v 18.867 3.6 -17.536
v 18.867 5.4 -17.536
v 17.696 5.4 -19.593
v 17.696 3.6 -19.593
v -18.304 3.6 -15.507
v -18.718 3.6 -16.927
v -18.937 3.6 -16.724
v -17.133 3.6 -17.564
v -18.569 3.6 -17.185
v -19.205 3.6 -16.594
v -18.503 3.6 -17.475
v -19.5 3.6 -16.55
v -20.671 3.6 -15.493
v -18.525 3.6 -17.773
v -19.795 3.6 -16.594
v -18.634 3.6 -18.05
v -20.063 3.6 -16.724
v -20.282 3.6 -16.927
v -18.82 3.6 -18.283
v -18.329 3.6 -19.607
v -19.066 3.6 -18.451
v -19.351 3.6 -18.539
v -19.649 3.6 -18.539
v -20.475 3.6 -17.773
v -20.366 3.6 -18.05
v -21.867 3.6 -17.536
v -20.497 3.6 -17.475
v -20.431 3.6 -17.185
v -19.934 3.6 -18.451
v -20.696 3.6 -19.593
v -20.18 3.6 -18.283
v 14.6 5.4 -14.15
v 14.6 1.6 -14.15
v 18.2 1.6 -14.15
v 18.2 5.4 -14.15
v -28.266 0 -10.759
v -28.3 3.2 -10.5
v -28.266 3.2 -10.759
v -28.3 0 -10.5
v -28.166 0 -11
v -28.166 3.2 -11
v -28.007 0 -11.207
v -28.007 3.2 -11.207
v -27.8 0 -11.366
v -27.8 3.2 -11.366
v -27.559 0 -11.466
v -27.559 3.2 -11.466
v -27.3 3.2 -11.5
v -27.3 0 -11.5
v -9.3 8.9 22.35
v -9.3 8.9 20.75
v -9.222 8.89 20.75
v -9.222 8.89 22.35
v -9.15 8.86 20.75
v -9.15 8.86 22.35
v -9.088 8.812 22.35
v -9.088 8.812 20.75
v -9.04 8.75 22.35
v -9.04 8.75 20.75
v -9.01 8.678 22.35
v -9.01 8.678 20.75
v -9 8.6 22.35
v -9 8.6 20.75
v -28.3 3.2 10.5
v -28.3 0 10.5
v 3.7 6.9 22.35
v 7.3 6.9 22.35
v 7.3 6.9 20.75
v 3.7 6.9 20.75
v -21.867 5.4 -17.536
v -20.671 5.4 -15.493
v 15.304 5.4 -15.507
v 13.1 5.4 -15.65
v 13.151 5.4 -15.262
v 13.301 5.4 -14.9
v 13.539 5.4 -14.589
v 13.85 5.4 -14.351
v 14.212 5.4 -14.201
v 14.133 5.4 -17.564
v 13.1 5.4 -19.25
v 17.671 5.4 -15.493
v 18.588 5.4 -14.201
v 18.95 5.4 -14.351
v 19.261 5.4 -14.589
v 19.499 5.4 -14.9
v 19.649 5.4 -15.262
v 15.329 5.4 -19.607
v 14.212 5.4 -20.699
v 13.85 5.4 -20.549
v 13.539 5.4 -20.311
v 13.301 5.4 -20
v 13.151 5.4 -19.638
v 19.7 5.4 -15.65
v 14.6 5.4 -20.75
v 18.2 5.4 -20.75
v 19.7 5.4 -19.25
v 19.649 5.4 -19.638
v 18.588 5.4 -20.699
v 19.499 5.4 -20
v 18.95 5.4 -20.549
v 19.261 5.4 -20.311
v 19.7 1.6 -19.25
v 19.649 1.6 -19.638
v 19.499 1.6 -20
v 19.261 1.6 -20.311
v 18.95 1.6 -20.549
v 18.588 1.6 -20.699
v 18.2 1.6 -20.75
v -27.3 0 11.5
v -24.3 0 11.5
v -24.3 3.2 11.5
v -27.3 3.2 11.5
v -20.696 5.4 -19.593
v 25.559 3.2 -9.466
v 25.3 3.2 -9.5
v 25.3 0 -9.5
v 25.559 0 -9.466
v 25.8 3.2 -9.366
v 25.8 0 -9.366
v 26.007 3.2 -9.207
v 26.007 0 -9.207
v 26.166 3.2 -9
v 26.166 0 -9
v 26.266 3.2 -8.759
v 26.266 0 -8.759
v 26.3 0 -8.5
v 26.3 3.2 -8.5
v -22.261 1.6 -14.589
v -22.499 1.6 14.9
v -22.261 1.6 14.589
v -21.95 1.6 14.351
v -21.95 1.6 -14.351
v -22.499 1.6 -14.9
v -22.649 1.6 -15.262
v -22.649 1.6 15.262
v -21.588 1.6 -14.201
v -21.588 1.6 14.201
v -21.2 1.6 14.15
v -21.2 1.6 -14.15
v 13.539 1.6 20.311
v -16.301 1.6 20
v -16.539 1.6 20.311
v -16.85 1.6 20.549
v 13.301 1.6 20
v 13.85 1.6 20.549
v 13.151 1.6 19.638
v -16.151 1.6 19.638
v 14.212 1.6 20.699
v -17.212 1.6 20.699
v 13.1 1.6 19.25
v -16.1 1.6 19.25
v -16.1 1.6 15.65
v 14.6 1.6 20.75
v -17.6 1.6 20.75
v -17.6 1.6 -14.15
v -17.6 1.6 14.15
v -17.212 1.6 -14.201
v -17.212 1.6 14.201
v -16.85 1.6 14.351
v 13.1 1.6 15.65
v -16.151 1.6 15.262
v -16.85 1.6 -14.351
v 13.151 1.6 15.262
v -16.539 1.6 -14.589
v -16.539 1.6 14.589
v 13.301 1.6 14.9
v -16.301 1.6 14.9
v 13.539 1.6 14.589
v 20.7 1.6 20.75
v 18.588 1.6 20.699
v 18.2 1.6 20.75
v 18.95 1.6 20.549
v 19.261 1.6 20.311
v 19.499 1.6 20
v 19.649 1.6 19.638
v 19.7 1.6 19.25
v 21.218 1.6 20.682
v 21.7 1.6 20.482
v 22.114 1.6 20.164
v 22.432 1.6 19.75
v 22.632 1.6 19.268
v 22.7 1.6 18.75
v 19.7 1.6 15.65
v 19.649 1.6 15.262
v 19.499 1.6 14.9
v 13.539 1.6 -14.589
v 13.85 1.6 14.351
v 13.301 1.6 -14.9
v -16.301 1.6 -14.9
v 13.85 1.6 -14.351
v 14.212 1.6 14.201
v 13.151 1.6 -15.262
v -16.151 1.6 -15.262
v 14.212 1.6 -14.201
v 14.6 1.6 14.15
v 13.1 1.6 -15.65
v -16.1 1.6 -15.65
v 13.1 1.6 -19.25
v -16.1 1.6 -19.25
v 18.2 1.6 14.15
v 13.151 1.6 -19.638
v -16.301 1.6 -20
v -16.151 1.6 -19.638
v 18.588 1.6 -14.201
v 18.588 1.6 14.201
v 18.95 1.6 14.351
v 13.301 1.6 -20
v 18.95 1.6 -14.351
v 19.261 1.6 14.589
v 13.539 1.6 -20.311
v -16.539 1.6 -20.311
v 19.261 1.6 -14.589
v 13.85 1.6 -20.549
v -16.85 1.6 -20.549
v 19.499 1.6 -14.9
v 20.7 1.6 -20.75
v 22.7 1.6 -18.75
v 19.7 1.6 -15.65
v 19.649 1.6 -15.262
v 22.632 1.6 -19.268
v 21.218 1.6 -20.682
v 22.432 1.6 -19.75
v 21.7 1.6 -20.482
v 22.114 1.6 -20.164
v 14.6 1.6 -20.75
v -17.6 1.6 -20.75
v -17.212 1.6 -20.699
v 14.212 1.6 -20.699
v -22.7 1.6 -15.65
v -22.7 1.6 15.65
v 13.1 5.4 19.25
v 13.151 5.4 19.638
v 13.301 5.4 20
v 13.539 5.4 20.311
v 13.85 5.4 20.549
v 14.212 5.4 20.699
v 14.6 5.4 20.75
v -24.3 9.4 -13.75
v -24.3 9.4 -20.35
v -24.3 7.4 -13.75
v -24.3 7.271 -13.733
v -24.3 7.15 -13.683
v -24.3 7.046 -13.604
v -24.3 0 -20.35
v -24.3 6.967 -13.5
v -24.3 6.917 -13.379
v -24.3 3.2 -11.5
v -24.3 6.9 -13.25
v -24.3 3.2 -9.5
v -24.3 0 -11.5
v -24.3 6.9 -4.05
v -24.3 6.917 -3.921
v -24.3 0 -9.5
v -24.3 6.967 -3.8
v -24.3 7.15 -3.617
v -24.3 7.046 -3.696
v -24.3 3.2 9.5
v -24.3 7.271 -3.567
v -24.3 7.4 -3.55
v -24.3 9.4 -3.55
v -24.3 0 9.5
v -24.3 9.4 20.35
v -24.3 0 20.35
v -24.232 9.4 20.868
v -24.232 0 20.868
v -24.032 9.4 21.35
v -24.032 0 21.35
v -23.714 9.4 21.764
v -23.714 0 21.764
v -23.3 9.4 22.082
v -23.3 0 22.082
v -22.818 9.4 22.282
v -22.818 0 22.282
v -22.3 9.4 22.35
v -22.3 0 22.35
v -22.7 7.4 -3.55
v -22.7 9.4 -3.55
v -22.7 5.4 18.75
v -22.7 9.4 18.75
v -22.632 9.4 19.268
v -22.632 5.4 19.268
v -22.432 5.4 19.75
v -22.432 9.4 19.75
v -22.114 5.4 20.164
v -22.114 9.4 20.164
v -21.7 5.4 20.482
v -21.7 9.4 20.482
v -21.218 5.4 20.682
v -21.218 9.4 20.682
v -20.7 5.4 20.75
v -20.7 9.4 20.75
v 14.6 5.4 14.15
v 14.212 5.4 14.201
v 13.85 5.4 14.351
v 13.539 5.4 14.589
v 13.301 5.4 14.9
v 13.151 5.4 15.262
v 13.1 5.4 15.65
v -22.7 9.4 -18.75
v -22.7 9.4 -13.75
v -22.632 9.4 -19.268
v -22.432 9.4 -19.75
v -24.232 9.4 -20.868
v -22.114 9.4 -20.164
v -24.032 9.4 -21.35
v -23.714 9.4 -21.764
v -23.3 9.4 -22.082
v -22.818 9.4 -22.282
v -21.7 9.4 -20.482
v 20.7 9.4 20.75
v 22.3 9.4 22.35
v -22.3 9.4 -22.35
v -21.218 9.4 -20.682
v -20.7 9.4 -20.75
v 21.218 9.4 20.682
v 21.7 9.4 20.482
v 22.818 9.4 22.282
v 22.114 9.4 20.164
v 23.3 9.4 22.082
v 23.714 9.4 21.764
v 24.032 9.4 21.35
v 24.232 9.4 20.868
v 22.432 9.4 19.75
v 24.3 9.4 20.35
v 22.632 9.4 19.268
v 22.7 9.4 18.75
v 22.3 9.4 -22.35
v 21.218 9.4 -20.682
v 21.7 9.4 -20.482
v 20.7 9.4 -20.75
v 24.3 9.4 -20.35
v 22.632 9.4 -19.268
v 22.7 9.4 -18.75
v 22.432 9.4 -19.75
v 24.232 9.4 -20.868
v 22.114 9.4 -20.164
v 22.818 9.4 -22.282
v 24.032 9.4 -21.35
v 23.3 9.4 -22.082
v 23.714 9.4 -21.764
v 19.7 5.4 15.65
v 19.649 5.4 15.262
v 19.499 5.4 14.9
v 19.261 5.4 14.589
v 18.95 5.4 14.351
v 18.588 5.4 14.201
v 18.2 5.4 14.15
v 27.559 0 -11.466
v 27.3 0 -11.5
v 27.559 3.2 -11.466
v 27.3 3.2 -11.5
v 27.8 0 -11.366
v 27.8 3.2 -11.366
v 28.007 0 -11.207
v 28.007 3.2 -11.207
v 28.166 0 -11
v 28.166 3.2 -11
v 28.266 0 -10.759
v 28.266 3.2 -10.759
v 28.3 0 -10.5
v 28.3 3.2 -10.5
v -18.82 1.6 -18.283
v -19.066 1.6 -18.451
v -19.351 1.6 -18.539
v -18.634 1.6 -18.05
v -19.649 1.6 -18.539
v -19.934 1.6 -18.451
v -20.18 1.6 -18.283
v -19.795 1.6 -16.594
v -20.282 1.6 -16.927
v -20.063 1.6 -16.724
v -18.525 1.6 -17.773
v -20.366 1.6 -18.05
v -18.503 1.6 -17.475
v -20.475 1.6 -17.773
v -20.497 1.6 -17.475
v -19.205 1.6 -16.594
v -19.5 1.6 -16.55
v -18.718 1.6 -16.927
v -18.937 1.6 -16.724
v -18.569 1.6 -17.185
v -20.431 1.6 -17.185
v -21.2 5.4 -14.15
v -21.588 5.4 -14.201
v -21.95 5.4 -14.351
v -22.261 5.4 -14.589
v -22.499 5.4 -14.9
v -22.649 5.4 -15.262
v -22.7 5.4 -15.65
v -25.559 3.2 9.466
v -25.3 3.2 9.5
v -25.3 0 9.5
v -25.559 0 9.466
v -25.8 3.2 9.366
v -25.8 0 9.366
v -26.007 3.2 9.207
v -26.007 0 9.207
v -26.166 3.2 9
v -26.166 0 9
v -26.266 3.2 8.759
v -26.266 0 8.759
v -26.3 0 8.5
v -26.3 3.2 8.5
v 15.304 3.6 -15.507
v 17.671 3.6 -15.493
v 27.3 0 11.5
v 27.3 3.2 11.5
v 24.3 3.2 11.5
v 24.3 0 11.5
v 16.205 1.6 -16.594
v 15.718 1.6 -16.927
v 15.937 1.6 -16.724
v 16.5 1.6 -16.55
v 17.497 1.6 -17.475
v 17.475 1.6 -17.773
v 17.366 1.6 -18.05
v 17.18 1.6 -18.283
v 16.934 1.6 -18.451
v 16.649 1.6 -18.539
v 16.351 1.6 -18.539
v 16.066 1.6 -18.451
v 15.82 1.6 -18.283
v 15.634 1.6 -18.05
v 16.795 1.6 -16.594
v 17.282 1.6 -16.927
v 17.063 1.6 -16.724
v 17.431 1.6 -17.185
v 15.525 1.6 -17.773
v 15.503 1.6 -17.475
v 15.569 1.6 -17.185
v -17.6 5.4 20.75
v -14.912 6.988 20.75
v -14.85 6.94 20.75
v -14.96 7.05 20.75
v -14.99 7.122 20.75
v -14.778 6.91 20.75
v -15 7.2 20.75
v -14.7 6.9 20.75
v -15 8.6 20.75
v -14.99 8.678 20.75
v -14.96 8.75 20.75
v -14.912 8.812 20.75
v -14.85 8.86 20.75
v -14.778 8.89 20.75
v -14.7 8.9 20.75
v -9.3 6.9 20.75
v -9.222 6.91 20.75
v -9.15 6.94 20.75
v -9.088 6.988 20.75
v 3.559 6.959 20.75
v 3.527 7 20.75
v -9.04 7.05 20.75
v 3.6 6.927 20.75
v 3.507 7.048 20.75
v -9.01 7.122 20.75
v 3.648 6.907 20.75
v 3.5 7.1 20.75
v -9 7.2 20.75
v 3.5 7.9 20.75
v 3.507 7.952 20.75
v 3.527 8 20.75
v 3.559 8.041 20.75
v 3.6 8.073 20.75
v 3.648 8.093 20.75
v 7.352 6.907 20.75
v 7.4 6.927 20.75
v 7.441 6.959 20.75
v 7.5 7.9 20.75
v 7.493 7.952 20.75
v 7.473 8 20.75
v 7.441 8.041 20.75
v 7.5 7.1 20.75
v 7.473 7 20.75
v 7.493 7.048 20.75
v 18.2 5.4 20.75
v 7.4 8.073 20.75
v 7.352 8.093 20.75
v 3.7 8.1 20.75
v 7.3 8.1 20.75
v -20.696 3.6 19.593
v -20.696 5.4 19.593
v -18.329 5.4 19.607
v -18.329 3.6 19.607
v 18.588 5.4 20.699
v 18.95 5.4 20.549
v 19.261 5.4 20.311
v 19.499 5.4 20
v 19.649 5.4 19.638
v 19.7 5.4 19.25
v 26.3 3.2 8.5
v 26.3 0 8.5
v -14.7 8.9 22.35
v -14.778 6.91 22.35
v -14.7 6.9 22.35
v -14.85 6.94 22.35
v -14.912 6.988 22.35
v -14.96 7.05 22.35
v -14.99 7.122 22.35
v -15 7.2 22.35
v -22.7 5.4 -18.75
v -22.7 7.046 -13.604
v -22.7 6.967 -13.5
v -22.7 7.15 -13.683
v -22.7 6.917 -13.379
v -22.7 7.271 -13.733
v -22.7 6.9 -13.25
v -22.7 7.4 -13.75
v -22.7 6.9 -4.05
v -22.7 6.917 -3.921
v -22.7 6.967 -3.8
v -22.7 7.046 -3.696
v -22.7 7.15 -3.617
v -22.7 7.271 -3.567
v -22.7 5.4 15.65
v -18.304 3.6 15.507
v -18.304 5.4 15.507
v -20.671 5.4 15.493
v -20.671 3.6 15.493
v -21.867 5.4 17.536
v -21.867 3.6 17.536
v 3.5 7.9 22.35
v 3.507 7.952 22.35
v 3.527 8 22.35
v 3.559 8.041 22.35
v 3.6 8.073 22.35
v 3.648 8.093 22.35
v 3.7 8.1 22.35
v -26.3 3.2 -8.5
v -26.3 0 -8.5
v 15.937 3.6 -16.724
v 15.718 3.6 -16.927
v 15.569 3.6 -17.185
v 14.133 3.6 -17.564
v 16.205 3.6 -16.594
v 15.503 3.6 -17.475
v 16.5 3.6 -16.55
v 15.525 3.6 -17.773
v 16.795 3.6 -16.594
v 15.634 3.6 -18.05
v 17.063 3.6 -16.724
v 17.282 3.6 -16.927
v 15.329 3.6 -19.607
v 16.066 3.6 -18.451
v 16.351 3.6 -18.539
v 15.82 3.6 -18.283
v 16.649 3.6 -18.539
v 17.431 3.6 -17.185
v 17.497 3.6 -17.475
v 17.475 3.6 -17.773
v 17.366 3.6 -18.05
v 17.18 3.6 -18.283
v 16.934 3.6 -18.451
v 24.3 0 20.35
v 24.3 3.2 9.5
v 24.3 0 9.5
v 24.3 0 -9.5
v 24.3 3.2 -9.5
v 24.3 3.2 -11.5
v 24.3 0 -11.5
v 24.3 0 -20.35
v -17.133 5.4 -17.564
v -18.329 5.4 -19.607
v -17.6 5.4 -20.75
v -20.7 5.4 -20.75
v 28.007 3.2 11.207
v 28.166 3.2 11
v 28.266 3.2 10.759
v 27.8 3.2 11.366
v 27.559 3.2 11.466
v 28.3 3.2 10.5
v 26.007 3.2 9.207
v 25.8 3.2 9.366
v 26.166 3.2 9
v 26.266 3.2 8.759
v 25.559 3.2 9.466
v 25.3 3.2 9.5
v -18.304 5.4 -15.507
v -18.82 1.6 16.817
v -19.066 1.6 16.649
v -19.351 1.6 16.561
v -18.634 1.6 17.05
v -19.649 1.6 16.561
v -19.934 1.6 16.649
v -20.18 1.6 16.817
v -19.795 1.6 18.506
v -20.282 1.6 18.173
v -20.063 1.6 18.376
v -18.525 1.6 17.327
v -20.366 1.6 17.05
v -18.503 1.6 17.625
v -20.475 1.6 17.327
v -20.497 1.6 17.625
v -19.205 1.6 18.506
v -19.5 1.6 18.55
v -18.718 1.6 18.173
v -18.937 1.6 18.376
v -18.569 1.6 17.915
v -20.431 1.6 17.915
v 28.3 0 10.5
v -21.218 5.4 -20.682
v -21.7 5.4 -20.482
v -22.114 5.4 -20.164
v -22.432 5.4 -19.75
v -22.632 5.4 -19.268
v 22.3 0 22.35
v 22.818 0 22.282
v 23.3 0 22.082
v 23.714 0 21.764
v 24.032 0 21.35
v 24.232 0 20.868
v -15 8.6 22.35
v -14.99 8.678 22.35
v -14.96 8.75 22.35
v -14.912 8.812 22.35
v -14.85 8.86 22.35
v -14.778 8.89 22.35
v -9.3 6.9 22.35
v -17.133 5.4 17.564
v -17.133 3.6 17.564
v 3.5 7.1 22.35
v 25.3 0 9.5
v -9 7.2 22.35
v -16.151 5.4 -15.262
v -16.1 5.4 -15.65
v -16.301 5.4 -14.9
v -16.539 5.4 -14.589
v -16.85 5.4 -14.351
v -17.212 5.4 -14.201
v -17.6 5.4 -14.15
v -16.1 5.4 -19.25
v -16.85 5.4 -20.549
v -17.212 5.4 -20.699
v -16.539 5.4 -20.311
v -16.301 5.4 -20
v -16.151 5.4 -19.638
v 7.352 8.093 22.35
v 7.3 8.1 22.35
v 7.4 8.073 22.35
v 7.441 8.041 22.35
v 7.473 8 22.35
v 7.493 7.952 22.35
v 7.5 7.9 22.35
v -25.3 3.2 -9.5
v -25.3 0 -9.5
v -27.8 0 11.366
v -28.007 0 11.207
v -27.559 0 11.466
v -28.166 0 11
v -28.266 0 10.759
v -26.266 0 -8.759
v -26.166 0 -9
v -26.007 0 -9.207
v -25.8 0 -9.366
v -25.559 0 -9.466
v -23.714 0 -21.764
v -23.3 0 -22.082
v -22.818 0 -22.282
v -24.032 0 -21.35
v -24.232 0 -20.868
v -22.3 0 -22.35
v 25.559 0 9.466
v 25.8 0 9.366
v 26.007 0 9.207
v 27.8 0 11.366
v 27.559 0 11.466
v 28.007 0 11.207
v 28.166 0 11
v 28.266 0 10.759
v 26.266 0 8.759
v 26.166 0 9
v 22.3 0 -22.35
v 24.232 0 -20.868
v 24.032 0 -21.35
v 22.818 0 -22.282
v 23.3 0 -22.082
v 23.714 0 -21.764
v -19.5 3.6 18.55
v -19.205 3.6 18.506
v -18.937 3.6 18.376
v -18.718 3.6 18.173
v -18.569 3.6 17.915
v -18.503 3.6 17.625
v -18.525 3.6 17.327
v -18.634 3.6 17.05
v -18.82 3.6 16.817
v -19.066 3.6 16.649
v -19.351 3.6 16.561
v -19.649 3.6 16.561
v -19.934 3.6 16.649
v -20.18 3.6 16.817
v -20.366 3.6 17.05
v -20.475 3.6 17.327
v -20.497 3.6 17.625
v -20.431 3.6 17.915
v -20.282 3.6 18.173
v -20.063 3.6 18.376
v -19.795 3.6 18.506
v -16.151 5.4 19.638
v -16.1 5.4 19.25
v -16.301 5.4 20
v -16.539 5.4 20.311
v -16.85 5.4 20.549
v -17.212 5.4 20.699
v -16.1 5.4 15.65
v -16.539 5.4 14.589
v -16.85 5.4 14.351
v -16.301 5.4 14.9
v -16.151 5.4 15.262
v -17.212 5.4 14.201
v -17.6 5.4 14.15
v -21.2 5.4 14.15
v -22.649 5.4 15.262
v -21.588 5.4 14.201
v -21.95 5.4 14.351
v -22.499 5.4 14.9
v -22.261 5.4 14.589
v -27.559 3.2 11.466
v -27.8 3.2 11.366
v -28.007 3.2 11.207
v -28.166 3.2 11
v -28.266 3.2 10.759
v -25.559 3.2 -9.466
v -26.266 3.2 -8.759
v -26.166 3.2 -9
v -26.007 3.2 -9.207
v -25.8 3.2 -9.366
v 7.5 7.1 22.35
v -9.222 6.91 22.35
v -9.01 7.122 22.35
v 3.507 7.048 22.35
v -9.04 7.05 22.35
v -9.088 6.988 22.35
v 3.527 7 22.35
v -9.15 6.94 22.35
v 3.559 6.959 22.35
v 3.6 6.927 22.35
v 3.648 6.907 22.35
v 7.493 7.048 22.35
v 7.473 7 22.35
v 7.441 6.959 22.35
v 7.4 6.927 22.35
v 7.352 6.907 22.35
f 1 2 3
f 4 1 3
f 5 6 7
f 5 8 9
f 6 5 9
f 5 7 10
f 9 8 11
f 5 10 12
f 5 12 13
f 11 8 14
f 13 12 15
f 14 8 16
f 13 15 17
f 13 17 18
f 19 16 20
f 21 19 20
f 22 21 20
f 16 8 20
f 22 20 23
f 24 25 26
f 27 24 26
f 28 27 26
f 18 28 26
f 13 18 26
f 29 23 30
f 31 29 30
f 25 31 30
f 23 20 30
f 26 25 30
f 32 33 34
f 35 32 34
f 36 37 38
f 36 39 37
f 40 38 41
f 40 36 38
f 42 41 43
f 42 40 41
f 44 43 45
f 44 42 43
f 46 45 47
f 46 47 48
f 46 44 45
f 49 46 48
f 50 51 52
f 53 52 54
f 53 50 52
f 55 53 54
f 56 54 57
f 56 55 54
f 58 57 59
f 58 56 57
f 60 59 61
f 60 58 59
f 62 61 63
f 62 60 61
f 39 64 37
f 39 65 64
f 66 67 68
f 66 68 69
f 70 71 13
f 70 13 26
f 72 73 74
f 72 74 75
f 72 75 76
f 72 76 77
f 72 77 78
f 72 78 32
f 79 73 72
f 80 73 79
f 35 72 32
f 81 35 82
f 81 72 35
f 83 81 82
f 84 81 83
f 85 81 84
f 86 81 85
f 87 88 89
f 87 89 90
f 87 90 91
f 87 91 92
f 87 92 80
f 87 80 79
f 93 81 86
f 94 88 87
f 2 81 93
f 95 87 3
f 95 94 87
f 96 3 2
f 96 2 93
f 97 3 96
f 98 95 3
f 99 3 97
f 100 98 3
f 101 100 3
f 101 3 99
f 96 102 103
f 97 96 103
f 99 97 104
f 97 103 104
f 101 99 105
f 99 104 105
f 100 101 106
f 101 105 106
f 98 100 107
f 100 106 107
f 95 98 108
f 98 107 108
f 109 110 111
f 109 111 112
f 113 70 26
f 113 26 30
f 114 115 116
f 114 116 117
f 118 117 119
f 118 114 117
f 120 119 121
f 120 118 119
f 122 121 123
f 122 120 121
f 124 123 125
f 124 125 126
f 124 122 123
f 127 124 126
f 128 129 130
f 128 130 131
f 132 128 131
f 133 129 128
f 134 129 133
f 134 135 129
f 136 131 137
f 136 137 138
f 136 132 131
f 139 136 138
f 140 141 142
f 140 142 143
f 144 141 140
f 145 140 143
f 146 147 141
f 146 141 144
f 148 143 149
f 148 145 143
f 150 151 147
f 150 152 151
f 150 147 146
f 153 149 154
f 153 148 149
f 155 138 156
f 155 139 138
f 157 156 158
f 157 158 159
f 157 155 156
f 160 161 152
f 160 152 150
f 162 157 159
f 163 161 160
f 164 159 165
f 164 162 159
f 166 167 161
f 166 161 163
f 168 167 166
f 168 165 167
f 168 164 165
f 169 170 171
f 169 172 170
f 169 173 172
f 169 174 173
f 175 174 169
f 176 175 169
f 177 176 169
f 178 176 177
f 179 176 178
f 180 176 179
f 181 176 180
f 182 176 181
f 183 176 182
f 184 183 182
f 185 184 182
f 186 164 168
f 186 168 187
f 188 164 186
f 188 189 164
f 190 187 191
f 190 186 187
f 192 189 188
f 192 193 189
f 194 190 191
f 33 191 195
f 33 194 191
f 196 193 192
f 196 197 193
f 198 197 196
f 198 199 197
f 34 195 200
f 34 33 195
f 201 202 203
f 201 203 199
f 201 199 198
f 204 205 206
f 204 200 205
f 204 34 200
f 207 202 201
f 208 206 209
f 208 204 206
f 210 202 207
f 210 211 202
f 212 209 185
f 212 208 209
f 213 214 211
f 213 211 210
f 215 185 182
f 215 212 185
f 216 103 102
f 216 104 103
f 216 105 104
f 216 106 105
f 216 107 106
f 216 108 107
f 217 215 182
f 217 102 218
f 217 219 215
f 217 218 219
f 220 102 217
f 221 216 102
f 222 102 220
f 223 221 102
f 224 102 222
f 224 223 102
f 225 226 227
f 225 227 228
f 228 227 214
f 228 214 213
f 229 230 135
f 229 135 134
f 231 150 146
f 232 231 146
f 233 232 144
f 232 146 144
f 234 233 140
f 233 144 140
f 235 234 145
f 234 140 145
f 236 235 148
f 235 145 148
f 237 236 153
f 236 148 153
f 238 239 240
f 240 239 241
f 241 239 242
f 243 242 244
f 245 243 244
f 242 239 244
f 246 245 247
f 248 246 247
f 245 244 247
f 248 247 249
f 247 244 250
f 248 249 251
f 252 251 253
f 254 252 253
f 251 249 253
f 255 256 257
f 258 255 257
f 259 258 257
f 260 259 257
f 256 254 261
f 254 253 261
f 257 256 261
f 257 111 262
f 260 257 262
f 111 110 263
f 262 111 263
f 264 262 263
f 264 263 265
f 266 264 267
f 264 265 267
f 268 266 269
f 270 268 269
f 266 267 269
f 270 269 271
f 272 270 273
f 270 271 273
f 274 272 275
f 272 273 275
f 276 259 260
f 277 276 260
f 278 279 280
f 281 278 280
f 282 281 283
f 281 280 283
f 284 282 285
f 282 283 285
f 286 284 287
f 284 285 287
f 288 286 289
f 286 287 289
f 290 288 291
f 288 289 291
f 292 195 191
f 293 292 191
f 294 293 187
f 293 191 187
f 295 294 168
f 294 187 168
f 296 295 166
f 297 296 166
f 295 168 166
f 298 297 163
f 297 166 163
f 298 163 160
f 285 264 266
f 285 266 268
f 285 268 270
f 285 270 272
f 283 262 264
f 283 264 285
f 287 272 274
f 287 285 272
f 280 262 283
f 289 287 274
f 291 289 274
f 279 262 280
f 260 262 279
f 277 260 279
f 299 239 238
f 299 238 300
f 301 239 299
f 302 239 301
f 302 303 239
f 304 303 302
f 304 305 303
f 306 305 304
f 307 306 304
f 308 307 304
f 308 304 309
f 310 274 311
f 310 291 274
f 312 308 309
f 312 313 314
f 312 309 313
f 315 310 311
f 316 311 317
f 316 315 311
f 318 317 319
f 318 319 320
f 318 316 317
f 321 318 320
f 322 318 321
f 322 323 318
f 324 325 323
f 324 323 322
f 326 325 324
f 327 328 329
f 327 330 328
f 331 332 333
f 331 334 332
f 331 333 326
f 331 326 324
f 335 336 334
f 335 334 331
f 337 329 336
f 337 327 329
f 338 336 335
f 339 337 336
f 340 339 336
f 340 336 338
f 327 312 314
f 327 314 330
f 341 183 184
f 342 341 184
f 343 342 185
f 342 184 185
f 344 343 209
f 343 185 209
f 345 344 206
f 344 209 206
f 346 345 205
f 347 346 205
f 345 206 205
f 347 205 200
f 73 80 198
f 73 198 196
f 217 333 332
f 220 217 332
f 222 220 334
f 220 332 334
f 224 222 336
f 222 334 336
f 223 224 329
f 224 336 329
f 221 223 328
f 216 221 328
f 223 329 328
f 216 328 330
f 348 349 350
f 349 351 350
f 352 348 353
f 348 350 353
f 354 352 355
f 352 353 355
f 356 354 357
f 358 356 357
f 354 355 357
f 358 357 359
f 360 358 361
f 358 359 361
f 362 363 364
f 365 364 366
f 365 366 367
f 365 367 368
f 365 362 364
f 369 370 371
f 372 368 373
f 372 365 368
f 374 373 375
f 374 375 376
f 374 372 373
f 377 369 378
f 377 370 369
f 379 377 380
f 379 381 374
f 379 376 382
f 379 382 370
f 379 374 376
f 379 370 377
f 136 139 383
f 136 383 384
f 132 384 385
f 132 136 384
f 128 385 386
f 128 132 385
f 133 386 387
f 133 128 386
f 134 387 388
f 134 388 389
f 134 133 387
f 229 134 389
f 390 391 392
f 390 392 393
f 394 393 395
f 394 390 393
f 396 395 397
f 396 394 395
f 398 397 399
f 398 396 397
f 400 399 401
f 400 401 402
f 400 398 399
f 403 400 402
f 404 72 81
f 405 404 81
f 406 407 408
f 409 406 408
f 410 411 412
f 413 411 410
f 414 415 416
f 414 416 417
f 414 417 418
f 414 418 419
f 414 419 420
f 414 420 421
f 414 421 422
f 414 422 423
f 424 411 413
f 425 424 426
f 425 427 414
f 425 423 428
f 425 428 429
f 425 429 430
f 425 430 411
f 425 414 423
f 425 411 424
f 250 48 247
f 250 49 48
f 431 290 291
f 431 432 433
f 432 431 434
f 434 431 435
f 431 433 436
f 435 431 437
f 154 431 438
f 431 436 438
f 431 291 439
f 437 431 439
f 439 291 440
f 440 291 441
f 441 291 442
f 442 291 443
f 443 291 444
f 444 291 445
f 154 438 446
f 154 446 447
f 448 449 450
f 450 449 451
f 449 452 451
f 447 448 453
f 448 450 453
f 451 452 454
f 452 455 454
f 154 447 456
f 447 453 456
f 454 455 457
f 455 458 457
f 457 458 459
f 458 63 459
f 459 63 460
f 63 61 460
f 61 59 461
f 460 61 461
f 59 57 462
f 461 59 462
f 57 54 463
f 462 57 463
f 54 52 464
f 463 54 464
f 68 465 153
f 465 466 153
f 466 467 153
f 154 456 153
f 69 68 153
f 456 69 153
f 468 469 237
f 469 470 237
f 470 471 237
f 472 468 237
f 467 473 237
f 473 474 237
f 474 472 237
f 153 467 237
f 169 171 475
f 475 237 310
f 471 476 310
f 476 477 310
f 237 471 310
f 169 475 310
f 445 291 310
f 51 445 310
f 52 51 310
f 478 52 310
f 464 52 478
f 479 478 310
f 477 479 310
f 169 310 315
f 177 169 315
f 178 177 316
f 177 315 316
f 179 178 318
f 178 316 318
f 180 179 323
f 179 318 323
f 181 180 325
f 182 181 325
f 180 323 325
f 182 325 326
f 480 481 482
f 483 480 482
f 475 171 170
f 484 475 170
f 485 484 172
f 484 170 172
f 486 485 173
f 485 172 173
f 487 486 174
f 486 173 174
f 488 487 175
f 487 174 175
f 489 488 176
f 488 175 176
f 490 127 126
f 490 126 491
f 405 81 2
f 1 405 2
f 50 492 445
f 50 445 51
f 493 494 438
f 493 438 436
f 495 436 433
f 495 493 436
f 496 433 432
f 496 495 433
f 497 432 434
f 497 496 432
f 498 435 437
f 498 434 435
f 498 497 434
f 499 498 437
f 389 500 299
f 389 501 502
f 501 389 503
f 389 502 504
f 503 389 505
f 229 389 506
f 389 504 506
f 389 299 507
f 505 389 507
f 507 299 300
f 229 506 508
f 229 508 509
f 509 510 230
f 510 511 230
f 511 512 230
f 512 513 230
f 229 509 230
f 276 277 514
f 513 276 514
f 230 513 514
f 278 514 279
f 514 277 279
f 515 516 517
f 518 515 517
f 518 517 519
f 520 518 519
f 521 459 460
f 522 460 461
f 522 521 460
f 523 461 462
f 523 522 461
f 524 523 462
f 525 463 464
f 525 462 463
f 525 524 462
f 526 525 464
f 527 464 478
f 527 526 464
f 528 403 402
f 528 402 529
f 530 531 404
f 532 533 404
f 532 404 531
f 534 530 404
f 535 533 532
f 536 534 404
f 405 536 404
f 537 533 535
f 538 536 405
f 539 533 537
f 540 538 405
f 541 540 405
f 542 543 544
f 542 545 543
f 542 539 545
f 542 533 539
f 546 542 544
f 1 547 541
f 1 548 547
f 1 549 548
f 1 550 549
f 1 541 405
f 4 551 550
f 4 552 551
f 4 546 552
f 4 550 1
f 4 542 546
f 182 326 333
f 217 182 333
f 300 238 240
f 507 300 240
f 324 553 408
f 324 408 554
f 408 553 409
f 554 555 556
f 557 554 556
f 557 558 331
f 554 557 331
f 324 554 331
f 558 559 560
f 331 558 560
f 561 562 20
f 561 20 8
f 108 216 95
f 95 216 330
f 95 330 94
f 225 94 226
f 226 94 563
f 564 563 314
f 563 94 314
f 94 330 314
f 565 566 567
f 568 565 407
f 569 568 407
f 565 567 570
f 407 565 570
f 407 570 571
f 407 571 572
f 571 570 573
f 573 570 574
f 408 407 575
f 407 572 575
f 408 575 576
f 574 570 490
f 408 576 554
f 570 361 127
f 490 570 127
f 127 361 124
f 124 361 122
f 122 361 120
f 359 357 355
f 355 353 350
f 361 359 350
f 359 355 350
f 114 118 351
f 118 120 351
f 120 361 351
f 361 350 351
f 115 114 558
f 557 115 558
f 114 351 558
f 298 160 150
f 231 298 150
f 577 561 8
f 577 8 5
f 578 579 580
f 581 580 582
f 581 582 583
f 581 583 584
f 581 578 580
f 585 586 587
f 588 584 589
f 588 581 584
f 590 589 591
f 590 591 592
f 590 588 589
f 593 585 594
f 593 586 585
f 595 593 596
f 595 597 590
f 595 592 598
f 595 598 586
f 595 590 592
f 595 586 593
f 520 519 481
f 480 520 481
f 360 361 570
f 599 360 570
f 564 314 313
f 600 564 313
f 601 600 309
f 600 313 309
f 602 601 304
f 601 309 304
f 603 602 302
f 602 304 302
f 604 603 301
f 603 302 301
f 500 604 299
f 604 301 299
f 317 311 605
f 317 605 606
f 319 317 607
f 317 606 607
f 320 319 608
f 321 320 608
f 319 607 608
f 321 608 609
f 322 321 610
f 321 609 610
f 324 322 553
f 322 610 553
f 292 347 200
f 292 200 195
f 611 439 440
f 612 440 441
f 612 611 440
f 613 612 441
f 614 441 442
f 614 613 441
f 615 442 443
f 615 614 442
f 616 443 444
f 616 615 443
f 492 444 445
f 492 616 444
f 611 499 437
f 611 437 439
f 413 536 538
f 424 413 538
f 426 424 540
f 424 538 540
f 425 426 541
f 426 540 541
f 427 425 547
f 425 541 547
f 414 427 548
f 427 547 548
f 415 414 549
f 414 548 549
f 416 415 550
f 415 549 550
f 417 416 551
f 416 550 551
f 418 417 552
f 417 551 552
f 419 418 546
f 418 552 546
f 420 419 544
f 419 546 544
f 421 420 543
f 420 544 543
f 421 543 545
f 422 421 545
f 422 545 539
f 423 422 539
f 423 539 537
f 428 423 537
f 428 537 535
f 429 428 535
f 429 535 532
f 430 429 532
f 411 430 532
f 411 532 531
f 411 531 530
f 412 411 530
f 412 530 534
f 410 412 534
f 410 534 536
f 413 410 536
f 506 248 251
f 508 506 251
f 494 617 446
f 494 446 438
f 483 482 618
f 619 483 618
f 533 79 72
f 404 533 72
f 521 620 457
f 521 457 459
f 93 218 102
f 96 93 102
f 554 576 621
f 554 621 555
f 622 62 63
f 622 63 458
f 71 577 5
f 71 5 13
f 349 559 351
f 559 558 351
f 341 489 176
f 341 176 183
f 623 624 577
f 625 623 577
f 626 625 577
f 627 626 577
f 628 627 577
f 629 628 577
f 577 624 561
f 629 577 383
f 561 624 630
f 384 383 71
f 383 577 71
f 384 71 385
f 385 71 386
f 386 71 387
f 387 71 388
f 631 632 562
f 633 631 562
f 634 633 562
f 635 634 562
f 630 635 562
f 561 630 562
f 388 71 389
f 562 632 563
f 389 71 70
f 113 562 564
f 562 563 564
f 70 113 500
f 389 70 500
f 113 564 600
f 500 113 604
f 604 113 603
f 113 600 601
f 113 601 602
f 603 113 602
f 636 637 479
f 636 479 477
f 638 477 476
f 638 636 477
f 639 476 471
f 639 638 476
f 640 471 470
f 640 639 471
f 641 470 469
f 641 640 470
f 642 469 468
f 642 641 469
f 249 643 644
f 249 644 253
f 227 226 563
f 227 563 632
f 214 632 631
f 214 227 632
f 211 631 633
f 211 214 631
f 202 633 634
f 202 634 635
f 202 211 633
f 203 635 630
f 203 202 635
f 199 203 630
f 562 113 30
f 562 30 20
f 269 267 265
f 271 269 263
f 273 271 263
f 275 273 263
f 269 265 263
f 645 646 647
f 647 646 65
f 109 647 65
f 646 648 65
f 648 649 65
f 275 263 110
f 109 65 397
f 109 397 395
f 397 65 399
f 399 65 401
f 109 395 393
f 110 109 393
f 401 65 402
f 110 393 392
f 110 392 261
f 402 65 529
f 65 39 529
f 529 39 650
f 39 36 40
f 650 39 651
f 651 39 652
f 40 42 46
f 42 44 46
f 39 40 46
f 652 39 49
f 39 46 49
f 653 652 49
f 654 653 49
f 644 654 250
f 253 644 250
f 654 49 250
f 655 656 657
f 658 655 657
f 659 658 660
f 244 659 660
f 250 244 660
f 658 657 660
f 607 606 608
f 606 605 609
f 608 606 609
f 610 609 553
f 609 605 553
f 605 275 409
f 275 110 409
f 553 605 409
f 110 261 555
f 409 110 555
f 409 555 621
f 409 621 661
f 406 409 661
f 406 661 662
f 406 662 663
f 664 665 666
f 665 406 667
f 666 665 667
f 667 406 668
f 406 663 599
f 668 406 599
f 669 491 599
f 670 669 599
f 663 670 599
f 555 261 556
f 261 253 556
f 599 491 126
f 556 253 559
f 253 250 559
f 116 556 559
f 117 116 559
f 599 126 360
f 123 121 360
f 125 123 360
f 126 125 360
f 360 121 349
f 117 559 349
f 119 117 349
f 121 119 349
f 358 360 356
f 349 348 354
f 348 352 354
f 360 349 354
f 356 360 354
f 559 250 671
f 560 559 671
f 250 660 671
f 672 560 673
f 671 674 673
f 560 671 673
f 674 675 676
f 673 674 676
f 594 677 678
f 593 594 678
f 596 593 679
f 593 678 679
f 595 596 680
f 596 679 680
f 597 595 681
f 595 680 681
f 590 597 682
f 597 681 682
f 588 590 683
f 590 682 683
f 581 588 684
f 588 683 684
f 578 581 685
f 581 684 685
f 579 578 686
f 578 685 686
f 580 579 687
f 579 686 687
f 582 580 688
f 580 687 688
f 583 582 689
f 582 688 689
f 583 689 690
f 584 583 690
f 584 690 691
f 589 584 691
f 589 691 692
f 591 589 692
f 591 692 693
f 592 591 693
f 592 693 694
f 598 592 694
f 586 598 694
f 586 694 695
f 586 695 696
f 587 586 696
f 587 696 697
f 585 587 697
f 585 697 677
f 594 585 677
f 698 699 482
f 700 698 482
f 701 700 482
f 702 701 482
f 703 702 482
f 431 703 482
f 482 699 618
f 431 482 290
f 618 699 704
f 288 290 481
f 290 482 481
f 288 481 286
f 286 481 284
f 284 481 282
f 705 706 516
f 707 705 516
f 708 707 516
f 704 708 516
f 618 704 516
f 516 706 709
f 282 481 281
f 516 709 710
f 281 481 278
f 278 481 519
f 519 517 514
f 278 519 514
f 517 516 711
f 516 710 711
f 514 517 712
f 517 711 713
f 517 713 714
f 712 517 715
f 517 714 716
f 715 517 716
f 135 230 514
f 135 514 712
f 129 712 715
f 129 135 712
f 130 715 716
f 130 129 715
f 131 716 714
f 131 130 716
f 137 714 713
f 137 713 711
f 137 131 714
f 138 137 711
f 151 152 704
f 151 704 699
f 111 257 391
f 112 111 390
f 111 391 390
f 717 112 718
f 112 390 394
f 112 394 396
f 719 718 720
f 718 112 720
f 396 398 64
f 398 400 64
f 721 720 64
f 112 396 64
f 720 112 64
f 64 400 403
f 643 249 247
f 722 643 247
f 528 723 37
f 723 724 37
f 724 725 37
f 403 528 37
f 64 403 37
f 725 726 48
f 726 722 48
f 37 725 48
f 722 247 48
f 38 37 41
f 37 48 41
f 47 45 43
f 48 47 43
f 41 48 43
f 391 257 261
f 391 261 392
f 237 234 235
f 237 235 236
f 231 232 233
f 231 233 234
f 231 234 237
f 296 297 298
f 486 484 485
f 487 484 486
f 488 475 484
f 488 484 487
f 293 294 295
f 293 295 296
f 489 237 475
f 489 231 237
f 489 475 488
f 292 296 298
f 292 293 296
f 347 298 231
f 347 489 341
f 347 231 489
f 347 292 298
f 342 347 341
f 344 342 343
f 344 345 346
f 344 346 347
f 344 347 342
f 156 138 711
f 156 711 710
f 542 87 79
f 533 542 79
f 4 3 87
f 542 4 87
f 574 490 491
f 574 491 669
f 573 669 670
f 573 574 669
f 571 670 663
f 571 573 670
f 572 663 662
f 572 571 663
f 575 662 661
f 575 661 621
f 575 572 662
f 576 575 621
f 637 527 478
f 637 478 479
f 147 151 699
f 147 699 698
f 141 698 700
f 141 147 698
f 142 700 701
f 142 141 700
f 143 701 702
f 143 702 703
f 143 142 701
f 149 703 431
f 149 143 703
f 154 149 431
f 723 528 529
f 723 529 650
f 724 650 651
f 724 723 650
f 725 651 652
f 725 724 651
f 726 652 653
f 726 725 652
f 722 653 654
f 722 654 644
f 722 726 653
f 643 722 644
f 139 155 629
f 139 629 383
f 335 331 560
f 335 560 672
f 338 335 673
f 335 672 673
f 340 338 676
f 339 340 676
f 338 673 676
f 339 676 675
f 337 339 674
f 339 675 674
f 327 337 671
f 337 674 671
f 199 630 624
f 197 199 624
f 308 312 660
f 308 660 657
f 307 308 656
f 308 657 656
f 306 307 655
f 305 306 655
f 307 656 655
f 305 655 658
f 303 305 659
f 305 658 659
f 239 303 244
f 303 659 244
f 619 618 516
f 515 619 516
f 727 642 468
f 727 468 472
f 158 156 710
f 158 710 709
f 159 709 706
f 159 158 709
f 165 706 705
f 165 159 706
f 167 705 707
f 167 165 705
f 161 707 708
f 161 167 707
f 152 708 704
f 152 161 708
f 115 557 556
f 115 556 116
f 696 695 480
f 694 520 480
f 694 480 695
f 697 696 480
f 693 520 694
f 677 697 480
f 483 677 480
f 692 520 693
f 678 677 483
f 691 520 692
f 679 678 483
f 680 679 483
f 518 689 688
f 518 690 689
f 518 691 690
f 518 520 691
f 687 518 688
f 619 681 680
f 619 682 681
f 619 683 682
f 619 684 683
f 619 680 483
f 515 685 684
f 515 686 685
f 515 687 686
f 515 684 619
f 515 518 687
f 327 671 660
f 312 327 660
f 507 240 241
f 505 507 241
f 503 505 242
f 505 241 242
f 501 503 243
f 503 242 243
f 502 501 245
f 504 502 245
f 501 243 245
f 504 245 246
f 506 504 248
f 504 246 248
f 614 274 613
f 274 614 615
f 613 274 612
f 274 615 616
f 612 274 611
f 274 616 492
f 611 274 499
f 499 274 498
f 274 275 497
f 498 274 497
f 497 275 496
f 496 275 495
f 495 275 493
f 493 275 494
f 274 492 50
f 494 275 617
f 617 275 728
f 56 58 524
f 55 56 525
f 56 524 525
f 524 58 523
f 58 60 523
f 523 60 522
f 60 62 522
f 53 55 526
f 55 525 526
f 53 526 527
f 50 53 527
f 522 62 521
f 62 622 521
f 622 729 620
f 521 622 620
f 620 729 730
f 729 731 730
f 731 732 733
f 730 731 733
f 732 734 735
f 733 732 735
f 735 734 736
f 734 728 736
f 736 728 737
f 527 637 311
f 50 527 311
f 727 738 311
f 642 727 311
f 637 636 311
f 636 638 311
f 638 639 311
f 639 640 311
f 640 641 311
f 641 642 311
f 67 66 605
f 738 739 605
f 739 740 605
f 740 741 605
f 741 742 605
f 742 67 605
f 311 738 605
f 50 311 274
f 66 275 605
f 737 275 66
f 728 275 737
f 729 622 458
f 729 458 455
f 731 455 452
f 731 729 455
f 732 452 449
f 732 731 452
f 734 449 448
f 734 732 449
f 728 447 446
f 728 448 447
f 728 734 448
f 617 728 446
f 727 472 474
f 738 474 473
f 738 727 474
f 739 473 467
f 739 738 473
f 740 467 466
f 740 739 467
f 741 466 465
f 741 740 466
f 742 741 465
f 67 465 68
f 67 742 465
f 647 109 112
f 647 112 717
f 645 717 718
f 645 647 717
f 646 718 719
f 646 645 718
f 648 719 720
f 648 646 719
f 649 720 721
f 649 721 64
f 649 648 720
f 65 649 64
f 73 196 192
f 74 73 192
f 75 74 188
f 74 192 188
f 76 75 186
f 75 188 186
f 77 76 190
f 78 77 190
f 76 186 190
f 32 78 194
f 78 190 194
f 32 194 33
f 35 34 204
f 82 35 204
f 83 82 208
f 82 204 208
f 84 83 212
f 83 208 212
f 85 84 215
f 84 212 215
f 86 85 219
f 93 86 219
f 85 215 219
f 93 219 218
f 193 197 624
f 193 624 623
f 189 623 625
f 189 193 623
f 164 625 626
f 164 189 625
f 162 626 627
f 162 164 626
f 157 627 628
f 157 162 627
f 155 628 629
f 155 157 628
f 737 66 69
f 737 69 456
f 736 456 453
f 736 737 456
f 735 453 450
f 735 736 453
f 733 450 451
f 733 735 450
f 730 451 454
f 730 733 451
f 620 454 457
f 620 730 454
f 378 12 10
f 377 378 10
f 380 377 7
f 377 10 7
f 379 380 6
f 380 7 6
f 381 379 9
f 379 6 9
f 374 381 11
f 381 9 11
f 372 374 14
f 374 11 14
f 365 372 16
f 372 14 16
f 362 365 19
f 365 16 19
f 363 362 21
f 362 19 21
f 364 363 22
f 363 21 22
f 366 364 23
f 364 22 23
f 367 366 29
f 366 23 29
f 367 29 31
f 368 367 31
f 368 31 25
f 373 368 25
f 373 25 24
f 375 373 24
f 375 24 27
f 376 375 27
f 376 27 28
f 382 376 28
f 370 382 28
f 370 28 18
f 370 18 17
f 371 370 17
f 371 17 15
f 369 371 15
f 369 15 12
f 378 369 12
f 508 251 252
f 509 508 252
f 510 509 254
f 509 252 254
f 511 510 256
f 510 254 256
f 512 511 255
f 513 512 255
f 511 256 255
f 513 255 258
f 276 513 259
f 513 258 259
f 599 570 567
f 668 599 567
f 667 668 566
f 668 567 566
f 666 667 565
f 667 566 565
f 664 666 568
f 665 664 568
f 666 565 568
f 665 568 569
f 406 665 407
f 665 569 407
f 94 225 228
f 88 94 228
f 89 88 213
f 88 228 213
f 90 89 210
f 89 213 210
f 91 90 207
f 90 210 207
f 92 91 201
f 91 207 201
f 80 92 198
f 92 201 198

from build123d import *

# Parameters (mm, degrees)
EXTRUDE_1_DEPTH     = 9.4
CUT_EXTRUDE_1_DEPTH = 7.8
EXTRUDE_2_DEPTH     = 3.8
CUT_EXTRUDE_2_DEPTH = 1.8
SKETCH_5_R          = 1
CUT_EXTRUDE_4_DEPTH = 3.8
CUT_EXTRUDE_5_DEPTH = 2.8
CUT_EXTRUDE_6_DEPTH = 2.8
CUT_EXTRUDE_7_DEPTH = 2.8
EXTRUDE_3_DEPTH     = 1.6
CUT_EXTRUDE_8_DEPTH = 3.2


with BuildPart() as part:
    # 草图1 → 凸台-拉伸1 (new body)
    with BuildSketch(Plane(origin=(0, 0, 0), x_dir=(1, 0, 0), z_dir=(0, 1, 0))):
        with BuildLine():
            Line((-22.3, -22.35), (22.3, -22.35))
            ThreePointArc((22.3, -22.35), (23.714213562, -21.764213562), (24.3, -20.35))
            Line((24.3, -20.35), (24.3, 20.35))
            ThreePointArc((24.3, 20.35), (23.714213562, 21.764213562), (22.3, 22.35))
            Line((22.3, 22.35), (-22.3, 22.35))
            ThreePointArc((-22.3, 22.35), (-23.714213562, 21.764213562), (-24.3, 20.35))
            Line((-24.3, 20.35), (-24.3, -20.35))
            ThreePointArc((-24.3, -20.35), (-23.714213562, -21.764213562), (-22.3, -22.35))
        make_face()
    extrude(amount=EXTRUDE_1_DEPTH)

    # 草图2 → 切除-拉伸1 (cut)
    with BuildSketch(Plane(origin=(0, 9.4, 0), x_dir=(1, 0, 0), z_dir=(0, 1, 0))):
        with BuildLine():
            Line((-20.7, -20.75), (20.7, -20.75))
            ThreePointArc((20.7, -20.75), (22.114213562, -20.164213562), (22.7, -18.75))
            Line((22.7, -18.75), (22.7, 18.75))
            ThreePointArc((22.7, 18.75), (22.114213562, 20.164213562), (20.7, 20.75))
            Line((20.7, 20.75), (-20.7, 20.75))
            ThreePointArc((-20.7, 20.75), (-22.114213562, 20.164213562), (-22.7, 18.75))
            Line((-22.7, 18.75), (-22.7, -18.75))
            ThreePointArc((-22.7, -18.75), (-22.114213562, -20.164213562), (-20.7, -20.75))
        make_face()
    extrude(amount=-CUT_EXTRUDE_1_DEPTH, mode=Mode.SUBTRACT)

    # 草图3 → 凸台-拉伸2 (add)
    with BuildSketch(Plane(origin=(0, 1.6, 0), x_dir=(1, 0, 0), z_dir=(0, 1, 0))):
        with BuildLine():
            Line((-21.2, -14.15), (-17.6, -14.15))
            ThreePointArc((-17.6, -14.15), (-16.539339828, -14.589339828), (-16.1, -15.65))
            Line((-16.1, -15.65), (-16.1, -19.25))
            ThreePointArc((-16.1, -19.25), (-16.539339828, -20.310660172), (-17.6, -20.75))
            Line((-17.6, -20.75), (-22.7, -20.75))
            Line((-22.7, -20.75), (-22.7, -15.65))
            ThreePointArc((-22.7, -15.65), (-22.260660172, -14.589339828), (-21.2, -14.15))
        make_face()
        with BuildLine():
            Line((-22.7, 20.75), (-17.6, 20.75))
            ThreePointArc((-17.6, 20.75), (-16.539339828, 20.310660172), (-16.1, 19.25))
            Line((-16.1, 19.25), (-16.1, 15.65))
            ThreePointArc((-16.1, 15.65), (-16.539339828, 14.589339828), (-17.6, 14.15))
            Line((-17.6, 14.15), (-21.2, 14.15))
            ThreePointArc((-21.2, 14.15), (-22.260660172, 14.589339828), (-22.7, 15.65))
            Line((-22.7, 15.65), (-22.7, 20.75))
        make_face()
        with BuildLine():
            Line((19.7, 15.65), (19.7, 19.25))
            ThreePointArc((19.7, 19.25), (19.260660172, 20.310660172), (18.2, 20.75))
            Line((18.2, 20.75), (14.6, 20.75))
            ThreePointArc((14.6, 20.75), (13.539339828, 20.310660172), (13.1, 19.25))
            Line((13.1, 19.25), (13.1, 15.65))
            ThreePointArc((13.1, 15.65), (13.539339828, 14.589339828), (14.6, 14.15))
            Line((14.6, 14.15), (18.2, 14.15))
            ThreePointArc((18.2, 14.15), (19.260660172, 14.589339828), (19.7, 15.65))
        make_face()
        with BuildLine():
            Line((18.2, -14.15), (14.6, -14.15))
            ThreePointArc((14.6, -14.15), (13.539339828, -14.589339828), (13.1, -15.65))
            Line((13.1, -15.65), (13.1, -19.25))
            ThreePointArc((13.1, -19.25), (13.539339828, -20.310660172), (14.6, -20.75))
            Line((14.6, -20.75), (18.2, -20.75))
            ThreePointArc((18.2, -20.75), (19.260660172, -20.310660172), (19.7, -19.25))
            Line((19.7, -19.25), (19.7, -15.65))
            ThreePointArc((19.7, -15.65), (19.260660172, -14.589339828), (18.2, -14.15))
        make_face()
    extrude(amount=EXTRUDE_2_DEPTH)

    # 草图4 → 切除-拉伸2 (cut)
    with BuildSketch(Plane(origin=(0, 5.4, 0), x_dir=(1, 0, 0), z_dir=(0, 1, 0))):
        Polygon((-18.328981591, -19.607194502), (-17.132908096, -17.564465561), (-18.303926505, -15.507271059), (-20.671018409, -15.492805498), (-21.867091904, -17.535534439), (-20.696073495, -19.592728941), align=None)
        Polygon((-20.696073495, 19.592728941), (-18.328981591, 19.607194502), (-17.132908096, 17.564465561), (-18.303926505, 15.507271059), (-20.671018409, 15.492805498), (-21.867091904, 17.535534439), align=None)
        Polygon((18.867091904, 17.535534439), (17.696073495, 19.592728941), (15.328981591, 19.607194502), (14.132908096, 17.564465561), (15.303926505, 15.507271059), (17.671018409, 15.492805498), align=None)
    extrude(amount=-CUT_EXTRUDE_2_DEPTH, mode=Mode.SUBTRACT)

    # 草图5 → 切除-拉伸4 (cut)
    with BuildSketch(Plane(origin=(0, 5.4, 0), x_dir=(1, 0, 0), z_dir=(0, 1, 0))):
        with Locations(Location((-19.5, -17.55, 0), (0, 0, 270))):
            Circle(SKETCH_5_R)
        with Locations(Location((-19.5, 17.55, 0), (0, 0, 270))):
            Circle(SKETCH_5_R)
        with Locations(Location((16.5, 17.55, 0), (0, 0, 270))):
            Circle(SKETCH_5_R)
    extrude(amount=-CUT_EXTRUDE_4_DEPTH, mode=Mode.SUBTRACT)

    # 草图6 → 切除-拉伸5 (cut)
    with BuildSketch(Plane.ZY.offset(24.3)):
        with BuildLine():
            Line((-13.25, 6.9), (-4.05, 6.9))
            ThreePointArc((-4.05, 6.9), (-3.696446609, 7.046446609), (-3.55, 7.4))
            Line((-3.55, 7.4), (-3.55, 10.4))
            Line((-3.55, 10.4), (-13.75, 10.4))
            Line((-13.75, 10.4), (-13.75, 7.4))
            ThreePointArc((-13.75, 7.4), (-13.603553391, 7.046446609), (-13.25, 6.9))
        make_face()
    extrude(amount=-CUT_EXTRUDE_5_DEPTH, mode=Mode.SUBTRACT)

    # 草图7 → 切除-拉伸6 (cut)
    with BuildSketch(Plane.XY.offset(22.35)):
        with BuildLine():
            Line((-14.7, 8.9), (-9.3, 8.9))
            ThreePointArc((-9.3, 8.9), (-9.087867966, 8.812132034), (-9, 8.6))
            Line((-9, 8.6), (-9, 7.2))
            ThreePointArc((-9, 7.2), (-9.087867966, 6.987867966), (-9.3, 6.9))
            Line((-9.3, 6.9), (-14.7, 6.9))
            ThreePointArc((-14.7, 6.9), (-14.912132034, 6.987867966), (-15, 7.2))
            Line((-15, 7.2), (-15, 8.6))
            ThreePointArc((-15, 8.6), (-14.912132034, 8.812132034), (-14.7, 8.9))
        make_face()
    extrude(amount=-CUT_EXTRUDE_6_DEPTH, mode=Mode.SUBTRACT)

    # 草图8 → 切除-拉伸7 (cut)
    with BuildSketch(Plane.XY.offset(22.35)):
        with BuildLine():
            Line((3.7, 8.1), (7.3, 8.1))
            ThreePointArc((7.3, 8.1), (7.441421356, 8.041421356), (7.5, 7.9))
            Line((7.5, 7.9), (7.5, 7.1))
            ThreePointArc((7.5, 7.1), (7.441421356, 6.958578644), (7.3, 6.9))
            Line((7.3, 6.9), (3.7, 6.9))
            ThreePointArc((3.7, 6.9), (3.558578644, 6.958578644), (3.5, 7.1))
            Line((3.5, 7.1), (3.5, 7.9))
            ThreePointArc((3.5, 7.9), (3.558578644, 8.041421356), (3.7, 8.1))
        make_face()
    extrude(amount=-CUT_EXTRUDE_7_DEPTH, mode=Mode.SUBTRACT)

    # 草图12 → 凸台-拉伸3 (add, symmetric)
    with BuildSketch(Plane(origin=(0, 1.6, 0), x_dir=(1, 0, 0), z_dir=(0, 1, 0))):
        with BuildLine():
            Line((-27.3, 11.5), (-24.3, 11.5))
            Line((-24.3, 11.5), (-24.3, -11.5))
            Line((-24.3, -11.5), (-27.3, -11.5))
            ThreePointArc((-27.3, -11.5), (-28.007106781, -11.207106781), (-28.3, -10.5))
            Line((-28.3, -10.5), (-28.3, 10.5))
            ThreePointArc((-28.3, 10.5), (-28.007106781, 11.207106781), (-27.3, 11.5))
        make_face()
        with BuildLine():
            Line((27.3, -11.5), (24.3, -11.5))
            Line((24.3, -11.5), (24.3, 11.5))
            Line((24.3, 11.5), (27.3, 11.5))
            ThreePointArc((27.3, 11.5), (28.007106781, 11.207106781), (28.3, 10.5))
            Line((28.3, 10.5), (28.3, -10.5))
            ThreePointArc((28.3, -10.5), (28.007106781, -11.207106781), (27.3, -11.5))
        make_face()
    extrude(amount=EXTRUDE_3_DEPTH, both=True)

    # 草图13 → 切除-拉伸8 (cut)
    with BuildSketch(Plane(origin=(0, 3.2, 0), x_dir=(1, 0, 0), z_dir=(0, 1, 0))):
        with BuildLine():
            Line((-25.3, 9.5), (-24.3, 9.5))
            Line((-24.3, 9.5), (-24.3, -9.5))
            Line((-24.3, -9.5), (-25.3, -9.5))
            ThreePointArc((-25.3, -9.5), (-26.007106781, -9.207106781), (-26.3, -8.5))
            Line((-26.3, -8.5), (-26.3, 8.5))
            ThreePointArc((-26.3, 8.5), (-26.007106781, 9.207106781), (-25.3, 9.5))
        make_face()
        with BuildLine():
            Line((25.3, -9.5), (24.3, -9.5))
            Line((24.3, -9.5), (24.3, 9.5))
            Line((24.3, 9.5), (25.3, 9.5))
            ThreePointArc((25.3, 9.5), (26.007106781, 9.207106781), (26.3, 8.5))
            Line((26.3, 8.5), (26.3, -8.5))
            ThreePointArc((26.3, -8.5), (26.007106781, -9.207106781), (25.3, -9.5))
        make_face()
    extrude(amount=-CUT_EXTRUDE_8_DEPTH, mode=Mode.SUBTRACT)


solid = part.part
